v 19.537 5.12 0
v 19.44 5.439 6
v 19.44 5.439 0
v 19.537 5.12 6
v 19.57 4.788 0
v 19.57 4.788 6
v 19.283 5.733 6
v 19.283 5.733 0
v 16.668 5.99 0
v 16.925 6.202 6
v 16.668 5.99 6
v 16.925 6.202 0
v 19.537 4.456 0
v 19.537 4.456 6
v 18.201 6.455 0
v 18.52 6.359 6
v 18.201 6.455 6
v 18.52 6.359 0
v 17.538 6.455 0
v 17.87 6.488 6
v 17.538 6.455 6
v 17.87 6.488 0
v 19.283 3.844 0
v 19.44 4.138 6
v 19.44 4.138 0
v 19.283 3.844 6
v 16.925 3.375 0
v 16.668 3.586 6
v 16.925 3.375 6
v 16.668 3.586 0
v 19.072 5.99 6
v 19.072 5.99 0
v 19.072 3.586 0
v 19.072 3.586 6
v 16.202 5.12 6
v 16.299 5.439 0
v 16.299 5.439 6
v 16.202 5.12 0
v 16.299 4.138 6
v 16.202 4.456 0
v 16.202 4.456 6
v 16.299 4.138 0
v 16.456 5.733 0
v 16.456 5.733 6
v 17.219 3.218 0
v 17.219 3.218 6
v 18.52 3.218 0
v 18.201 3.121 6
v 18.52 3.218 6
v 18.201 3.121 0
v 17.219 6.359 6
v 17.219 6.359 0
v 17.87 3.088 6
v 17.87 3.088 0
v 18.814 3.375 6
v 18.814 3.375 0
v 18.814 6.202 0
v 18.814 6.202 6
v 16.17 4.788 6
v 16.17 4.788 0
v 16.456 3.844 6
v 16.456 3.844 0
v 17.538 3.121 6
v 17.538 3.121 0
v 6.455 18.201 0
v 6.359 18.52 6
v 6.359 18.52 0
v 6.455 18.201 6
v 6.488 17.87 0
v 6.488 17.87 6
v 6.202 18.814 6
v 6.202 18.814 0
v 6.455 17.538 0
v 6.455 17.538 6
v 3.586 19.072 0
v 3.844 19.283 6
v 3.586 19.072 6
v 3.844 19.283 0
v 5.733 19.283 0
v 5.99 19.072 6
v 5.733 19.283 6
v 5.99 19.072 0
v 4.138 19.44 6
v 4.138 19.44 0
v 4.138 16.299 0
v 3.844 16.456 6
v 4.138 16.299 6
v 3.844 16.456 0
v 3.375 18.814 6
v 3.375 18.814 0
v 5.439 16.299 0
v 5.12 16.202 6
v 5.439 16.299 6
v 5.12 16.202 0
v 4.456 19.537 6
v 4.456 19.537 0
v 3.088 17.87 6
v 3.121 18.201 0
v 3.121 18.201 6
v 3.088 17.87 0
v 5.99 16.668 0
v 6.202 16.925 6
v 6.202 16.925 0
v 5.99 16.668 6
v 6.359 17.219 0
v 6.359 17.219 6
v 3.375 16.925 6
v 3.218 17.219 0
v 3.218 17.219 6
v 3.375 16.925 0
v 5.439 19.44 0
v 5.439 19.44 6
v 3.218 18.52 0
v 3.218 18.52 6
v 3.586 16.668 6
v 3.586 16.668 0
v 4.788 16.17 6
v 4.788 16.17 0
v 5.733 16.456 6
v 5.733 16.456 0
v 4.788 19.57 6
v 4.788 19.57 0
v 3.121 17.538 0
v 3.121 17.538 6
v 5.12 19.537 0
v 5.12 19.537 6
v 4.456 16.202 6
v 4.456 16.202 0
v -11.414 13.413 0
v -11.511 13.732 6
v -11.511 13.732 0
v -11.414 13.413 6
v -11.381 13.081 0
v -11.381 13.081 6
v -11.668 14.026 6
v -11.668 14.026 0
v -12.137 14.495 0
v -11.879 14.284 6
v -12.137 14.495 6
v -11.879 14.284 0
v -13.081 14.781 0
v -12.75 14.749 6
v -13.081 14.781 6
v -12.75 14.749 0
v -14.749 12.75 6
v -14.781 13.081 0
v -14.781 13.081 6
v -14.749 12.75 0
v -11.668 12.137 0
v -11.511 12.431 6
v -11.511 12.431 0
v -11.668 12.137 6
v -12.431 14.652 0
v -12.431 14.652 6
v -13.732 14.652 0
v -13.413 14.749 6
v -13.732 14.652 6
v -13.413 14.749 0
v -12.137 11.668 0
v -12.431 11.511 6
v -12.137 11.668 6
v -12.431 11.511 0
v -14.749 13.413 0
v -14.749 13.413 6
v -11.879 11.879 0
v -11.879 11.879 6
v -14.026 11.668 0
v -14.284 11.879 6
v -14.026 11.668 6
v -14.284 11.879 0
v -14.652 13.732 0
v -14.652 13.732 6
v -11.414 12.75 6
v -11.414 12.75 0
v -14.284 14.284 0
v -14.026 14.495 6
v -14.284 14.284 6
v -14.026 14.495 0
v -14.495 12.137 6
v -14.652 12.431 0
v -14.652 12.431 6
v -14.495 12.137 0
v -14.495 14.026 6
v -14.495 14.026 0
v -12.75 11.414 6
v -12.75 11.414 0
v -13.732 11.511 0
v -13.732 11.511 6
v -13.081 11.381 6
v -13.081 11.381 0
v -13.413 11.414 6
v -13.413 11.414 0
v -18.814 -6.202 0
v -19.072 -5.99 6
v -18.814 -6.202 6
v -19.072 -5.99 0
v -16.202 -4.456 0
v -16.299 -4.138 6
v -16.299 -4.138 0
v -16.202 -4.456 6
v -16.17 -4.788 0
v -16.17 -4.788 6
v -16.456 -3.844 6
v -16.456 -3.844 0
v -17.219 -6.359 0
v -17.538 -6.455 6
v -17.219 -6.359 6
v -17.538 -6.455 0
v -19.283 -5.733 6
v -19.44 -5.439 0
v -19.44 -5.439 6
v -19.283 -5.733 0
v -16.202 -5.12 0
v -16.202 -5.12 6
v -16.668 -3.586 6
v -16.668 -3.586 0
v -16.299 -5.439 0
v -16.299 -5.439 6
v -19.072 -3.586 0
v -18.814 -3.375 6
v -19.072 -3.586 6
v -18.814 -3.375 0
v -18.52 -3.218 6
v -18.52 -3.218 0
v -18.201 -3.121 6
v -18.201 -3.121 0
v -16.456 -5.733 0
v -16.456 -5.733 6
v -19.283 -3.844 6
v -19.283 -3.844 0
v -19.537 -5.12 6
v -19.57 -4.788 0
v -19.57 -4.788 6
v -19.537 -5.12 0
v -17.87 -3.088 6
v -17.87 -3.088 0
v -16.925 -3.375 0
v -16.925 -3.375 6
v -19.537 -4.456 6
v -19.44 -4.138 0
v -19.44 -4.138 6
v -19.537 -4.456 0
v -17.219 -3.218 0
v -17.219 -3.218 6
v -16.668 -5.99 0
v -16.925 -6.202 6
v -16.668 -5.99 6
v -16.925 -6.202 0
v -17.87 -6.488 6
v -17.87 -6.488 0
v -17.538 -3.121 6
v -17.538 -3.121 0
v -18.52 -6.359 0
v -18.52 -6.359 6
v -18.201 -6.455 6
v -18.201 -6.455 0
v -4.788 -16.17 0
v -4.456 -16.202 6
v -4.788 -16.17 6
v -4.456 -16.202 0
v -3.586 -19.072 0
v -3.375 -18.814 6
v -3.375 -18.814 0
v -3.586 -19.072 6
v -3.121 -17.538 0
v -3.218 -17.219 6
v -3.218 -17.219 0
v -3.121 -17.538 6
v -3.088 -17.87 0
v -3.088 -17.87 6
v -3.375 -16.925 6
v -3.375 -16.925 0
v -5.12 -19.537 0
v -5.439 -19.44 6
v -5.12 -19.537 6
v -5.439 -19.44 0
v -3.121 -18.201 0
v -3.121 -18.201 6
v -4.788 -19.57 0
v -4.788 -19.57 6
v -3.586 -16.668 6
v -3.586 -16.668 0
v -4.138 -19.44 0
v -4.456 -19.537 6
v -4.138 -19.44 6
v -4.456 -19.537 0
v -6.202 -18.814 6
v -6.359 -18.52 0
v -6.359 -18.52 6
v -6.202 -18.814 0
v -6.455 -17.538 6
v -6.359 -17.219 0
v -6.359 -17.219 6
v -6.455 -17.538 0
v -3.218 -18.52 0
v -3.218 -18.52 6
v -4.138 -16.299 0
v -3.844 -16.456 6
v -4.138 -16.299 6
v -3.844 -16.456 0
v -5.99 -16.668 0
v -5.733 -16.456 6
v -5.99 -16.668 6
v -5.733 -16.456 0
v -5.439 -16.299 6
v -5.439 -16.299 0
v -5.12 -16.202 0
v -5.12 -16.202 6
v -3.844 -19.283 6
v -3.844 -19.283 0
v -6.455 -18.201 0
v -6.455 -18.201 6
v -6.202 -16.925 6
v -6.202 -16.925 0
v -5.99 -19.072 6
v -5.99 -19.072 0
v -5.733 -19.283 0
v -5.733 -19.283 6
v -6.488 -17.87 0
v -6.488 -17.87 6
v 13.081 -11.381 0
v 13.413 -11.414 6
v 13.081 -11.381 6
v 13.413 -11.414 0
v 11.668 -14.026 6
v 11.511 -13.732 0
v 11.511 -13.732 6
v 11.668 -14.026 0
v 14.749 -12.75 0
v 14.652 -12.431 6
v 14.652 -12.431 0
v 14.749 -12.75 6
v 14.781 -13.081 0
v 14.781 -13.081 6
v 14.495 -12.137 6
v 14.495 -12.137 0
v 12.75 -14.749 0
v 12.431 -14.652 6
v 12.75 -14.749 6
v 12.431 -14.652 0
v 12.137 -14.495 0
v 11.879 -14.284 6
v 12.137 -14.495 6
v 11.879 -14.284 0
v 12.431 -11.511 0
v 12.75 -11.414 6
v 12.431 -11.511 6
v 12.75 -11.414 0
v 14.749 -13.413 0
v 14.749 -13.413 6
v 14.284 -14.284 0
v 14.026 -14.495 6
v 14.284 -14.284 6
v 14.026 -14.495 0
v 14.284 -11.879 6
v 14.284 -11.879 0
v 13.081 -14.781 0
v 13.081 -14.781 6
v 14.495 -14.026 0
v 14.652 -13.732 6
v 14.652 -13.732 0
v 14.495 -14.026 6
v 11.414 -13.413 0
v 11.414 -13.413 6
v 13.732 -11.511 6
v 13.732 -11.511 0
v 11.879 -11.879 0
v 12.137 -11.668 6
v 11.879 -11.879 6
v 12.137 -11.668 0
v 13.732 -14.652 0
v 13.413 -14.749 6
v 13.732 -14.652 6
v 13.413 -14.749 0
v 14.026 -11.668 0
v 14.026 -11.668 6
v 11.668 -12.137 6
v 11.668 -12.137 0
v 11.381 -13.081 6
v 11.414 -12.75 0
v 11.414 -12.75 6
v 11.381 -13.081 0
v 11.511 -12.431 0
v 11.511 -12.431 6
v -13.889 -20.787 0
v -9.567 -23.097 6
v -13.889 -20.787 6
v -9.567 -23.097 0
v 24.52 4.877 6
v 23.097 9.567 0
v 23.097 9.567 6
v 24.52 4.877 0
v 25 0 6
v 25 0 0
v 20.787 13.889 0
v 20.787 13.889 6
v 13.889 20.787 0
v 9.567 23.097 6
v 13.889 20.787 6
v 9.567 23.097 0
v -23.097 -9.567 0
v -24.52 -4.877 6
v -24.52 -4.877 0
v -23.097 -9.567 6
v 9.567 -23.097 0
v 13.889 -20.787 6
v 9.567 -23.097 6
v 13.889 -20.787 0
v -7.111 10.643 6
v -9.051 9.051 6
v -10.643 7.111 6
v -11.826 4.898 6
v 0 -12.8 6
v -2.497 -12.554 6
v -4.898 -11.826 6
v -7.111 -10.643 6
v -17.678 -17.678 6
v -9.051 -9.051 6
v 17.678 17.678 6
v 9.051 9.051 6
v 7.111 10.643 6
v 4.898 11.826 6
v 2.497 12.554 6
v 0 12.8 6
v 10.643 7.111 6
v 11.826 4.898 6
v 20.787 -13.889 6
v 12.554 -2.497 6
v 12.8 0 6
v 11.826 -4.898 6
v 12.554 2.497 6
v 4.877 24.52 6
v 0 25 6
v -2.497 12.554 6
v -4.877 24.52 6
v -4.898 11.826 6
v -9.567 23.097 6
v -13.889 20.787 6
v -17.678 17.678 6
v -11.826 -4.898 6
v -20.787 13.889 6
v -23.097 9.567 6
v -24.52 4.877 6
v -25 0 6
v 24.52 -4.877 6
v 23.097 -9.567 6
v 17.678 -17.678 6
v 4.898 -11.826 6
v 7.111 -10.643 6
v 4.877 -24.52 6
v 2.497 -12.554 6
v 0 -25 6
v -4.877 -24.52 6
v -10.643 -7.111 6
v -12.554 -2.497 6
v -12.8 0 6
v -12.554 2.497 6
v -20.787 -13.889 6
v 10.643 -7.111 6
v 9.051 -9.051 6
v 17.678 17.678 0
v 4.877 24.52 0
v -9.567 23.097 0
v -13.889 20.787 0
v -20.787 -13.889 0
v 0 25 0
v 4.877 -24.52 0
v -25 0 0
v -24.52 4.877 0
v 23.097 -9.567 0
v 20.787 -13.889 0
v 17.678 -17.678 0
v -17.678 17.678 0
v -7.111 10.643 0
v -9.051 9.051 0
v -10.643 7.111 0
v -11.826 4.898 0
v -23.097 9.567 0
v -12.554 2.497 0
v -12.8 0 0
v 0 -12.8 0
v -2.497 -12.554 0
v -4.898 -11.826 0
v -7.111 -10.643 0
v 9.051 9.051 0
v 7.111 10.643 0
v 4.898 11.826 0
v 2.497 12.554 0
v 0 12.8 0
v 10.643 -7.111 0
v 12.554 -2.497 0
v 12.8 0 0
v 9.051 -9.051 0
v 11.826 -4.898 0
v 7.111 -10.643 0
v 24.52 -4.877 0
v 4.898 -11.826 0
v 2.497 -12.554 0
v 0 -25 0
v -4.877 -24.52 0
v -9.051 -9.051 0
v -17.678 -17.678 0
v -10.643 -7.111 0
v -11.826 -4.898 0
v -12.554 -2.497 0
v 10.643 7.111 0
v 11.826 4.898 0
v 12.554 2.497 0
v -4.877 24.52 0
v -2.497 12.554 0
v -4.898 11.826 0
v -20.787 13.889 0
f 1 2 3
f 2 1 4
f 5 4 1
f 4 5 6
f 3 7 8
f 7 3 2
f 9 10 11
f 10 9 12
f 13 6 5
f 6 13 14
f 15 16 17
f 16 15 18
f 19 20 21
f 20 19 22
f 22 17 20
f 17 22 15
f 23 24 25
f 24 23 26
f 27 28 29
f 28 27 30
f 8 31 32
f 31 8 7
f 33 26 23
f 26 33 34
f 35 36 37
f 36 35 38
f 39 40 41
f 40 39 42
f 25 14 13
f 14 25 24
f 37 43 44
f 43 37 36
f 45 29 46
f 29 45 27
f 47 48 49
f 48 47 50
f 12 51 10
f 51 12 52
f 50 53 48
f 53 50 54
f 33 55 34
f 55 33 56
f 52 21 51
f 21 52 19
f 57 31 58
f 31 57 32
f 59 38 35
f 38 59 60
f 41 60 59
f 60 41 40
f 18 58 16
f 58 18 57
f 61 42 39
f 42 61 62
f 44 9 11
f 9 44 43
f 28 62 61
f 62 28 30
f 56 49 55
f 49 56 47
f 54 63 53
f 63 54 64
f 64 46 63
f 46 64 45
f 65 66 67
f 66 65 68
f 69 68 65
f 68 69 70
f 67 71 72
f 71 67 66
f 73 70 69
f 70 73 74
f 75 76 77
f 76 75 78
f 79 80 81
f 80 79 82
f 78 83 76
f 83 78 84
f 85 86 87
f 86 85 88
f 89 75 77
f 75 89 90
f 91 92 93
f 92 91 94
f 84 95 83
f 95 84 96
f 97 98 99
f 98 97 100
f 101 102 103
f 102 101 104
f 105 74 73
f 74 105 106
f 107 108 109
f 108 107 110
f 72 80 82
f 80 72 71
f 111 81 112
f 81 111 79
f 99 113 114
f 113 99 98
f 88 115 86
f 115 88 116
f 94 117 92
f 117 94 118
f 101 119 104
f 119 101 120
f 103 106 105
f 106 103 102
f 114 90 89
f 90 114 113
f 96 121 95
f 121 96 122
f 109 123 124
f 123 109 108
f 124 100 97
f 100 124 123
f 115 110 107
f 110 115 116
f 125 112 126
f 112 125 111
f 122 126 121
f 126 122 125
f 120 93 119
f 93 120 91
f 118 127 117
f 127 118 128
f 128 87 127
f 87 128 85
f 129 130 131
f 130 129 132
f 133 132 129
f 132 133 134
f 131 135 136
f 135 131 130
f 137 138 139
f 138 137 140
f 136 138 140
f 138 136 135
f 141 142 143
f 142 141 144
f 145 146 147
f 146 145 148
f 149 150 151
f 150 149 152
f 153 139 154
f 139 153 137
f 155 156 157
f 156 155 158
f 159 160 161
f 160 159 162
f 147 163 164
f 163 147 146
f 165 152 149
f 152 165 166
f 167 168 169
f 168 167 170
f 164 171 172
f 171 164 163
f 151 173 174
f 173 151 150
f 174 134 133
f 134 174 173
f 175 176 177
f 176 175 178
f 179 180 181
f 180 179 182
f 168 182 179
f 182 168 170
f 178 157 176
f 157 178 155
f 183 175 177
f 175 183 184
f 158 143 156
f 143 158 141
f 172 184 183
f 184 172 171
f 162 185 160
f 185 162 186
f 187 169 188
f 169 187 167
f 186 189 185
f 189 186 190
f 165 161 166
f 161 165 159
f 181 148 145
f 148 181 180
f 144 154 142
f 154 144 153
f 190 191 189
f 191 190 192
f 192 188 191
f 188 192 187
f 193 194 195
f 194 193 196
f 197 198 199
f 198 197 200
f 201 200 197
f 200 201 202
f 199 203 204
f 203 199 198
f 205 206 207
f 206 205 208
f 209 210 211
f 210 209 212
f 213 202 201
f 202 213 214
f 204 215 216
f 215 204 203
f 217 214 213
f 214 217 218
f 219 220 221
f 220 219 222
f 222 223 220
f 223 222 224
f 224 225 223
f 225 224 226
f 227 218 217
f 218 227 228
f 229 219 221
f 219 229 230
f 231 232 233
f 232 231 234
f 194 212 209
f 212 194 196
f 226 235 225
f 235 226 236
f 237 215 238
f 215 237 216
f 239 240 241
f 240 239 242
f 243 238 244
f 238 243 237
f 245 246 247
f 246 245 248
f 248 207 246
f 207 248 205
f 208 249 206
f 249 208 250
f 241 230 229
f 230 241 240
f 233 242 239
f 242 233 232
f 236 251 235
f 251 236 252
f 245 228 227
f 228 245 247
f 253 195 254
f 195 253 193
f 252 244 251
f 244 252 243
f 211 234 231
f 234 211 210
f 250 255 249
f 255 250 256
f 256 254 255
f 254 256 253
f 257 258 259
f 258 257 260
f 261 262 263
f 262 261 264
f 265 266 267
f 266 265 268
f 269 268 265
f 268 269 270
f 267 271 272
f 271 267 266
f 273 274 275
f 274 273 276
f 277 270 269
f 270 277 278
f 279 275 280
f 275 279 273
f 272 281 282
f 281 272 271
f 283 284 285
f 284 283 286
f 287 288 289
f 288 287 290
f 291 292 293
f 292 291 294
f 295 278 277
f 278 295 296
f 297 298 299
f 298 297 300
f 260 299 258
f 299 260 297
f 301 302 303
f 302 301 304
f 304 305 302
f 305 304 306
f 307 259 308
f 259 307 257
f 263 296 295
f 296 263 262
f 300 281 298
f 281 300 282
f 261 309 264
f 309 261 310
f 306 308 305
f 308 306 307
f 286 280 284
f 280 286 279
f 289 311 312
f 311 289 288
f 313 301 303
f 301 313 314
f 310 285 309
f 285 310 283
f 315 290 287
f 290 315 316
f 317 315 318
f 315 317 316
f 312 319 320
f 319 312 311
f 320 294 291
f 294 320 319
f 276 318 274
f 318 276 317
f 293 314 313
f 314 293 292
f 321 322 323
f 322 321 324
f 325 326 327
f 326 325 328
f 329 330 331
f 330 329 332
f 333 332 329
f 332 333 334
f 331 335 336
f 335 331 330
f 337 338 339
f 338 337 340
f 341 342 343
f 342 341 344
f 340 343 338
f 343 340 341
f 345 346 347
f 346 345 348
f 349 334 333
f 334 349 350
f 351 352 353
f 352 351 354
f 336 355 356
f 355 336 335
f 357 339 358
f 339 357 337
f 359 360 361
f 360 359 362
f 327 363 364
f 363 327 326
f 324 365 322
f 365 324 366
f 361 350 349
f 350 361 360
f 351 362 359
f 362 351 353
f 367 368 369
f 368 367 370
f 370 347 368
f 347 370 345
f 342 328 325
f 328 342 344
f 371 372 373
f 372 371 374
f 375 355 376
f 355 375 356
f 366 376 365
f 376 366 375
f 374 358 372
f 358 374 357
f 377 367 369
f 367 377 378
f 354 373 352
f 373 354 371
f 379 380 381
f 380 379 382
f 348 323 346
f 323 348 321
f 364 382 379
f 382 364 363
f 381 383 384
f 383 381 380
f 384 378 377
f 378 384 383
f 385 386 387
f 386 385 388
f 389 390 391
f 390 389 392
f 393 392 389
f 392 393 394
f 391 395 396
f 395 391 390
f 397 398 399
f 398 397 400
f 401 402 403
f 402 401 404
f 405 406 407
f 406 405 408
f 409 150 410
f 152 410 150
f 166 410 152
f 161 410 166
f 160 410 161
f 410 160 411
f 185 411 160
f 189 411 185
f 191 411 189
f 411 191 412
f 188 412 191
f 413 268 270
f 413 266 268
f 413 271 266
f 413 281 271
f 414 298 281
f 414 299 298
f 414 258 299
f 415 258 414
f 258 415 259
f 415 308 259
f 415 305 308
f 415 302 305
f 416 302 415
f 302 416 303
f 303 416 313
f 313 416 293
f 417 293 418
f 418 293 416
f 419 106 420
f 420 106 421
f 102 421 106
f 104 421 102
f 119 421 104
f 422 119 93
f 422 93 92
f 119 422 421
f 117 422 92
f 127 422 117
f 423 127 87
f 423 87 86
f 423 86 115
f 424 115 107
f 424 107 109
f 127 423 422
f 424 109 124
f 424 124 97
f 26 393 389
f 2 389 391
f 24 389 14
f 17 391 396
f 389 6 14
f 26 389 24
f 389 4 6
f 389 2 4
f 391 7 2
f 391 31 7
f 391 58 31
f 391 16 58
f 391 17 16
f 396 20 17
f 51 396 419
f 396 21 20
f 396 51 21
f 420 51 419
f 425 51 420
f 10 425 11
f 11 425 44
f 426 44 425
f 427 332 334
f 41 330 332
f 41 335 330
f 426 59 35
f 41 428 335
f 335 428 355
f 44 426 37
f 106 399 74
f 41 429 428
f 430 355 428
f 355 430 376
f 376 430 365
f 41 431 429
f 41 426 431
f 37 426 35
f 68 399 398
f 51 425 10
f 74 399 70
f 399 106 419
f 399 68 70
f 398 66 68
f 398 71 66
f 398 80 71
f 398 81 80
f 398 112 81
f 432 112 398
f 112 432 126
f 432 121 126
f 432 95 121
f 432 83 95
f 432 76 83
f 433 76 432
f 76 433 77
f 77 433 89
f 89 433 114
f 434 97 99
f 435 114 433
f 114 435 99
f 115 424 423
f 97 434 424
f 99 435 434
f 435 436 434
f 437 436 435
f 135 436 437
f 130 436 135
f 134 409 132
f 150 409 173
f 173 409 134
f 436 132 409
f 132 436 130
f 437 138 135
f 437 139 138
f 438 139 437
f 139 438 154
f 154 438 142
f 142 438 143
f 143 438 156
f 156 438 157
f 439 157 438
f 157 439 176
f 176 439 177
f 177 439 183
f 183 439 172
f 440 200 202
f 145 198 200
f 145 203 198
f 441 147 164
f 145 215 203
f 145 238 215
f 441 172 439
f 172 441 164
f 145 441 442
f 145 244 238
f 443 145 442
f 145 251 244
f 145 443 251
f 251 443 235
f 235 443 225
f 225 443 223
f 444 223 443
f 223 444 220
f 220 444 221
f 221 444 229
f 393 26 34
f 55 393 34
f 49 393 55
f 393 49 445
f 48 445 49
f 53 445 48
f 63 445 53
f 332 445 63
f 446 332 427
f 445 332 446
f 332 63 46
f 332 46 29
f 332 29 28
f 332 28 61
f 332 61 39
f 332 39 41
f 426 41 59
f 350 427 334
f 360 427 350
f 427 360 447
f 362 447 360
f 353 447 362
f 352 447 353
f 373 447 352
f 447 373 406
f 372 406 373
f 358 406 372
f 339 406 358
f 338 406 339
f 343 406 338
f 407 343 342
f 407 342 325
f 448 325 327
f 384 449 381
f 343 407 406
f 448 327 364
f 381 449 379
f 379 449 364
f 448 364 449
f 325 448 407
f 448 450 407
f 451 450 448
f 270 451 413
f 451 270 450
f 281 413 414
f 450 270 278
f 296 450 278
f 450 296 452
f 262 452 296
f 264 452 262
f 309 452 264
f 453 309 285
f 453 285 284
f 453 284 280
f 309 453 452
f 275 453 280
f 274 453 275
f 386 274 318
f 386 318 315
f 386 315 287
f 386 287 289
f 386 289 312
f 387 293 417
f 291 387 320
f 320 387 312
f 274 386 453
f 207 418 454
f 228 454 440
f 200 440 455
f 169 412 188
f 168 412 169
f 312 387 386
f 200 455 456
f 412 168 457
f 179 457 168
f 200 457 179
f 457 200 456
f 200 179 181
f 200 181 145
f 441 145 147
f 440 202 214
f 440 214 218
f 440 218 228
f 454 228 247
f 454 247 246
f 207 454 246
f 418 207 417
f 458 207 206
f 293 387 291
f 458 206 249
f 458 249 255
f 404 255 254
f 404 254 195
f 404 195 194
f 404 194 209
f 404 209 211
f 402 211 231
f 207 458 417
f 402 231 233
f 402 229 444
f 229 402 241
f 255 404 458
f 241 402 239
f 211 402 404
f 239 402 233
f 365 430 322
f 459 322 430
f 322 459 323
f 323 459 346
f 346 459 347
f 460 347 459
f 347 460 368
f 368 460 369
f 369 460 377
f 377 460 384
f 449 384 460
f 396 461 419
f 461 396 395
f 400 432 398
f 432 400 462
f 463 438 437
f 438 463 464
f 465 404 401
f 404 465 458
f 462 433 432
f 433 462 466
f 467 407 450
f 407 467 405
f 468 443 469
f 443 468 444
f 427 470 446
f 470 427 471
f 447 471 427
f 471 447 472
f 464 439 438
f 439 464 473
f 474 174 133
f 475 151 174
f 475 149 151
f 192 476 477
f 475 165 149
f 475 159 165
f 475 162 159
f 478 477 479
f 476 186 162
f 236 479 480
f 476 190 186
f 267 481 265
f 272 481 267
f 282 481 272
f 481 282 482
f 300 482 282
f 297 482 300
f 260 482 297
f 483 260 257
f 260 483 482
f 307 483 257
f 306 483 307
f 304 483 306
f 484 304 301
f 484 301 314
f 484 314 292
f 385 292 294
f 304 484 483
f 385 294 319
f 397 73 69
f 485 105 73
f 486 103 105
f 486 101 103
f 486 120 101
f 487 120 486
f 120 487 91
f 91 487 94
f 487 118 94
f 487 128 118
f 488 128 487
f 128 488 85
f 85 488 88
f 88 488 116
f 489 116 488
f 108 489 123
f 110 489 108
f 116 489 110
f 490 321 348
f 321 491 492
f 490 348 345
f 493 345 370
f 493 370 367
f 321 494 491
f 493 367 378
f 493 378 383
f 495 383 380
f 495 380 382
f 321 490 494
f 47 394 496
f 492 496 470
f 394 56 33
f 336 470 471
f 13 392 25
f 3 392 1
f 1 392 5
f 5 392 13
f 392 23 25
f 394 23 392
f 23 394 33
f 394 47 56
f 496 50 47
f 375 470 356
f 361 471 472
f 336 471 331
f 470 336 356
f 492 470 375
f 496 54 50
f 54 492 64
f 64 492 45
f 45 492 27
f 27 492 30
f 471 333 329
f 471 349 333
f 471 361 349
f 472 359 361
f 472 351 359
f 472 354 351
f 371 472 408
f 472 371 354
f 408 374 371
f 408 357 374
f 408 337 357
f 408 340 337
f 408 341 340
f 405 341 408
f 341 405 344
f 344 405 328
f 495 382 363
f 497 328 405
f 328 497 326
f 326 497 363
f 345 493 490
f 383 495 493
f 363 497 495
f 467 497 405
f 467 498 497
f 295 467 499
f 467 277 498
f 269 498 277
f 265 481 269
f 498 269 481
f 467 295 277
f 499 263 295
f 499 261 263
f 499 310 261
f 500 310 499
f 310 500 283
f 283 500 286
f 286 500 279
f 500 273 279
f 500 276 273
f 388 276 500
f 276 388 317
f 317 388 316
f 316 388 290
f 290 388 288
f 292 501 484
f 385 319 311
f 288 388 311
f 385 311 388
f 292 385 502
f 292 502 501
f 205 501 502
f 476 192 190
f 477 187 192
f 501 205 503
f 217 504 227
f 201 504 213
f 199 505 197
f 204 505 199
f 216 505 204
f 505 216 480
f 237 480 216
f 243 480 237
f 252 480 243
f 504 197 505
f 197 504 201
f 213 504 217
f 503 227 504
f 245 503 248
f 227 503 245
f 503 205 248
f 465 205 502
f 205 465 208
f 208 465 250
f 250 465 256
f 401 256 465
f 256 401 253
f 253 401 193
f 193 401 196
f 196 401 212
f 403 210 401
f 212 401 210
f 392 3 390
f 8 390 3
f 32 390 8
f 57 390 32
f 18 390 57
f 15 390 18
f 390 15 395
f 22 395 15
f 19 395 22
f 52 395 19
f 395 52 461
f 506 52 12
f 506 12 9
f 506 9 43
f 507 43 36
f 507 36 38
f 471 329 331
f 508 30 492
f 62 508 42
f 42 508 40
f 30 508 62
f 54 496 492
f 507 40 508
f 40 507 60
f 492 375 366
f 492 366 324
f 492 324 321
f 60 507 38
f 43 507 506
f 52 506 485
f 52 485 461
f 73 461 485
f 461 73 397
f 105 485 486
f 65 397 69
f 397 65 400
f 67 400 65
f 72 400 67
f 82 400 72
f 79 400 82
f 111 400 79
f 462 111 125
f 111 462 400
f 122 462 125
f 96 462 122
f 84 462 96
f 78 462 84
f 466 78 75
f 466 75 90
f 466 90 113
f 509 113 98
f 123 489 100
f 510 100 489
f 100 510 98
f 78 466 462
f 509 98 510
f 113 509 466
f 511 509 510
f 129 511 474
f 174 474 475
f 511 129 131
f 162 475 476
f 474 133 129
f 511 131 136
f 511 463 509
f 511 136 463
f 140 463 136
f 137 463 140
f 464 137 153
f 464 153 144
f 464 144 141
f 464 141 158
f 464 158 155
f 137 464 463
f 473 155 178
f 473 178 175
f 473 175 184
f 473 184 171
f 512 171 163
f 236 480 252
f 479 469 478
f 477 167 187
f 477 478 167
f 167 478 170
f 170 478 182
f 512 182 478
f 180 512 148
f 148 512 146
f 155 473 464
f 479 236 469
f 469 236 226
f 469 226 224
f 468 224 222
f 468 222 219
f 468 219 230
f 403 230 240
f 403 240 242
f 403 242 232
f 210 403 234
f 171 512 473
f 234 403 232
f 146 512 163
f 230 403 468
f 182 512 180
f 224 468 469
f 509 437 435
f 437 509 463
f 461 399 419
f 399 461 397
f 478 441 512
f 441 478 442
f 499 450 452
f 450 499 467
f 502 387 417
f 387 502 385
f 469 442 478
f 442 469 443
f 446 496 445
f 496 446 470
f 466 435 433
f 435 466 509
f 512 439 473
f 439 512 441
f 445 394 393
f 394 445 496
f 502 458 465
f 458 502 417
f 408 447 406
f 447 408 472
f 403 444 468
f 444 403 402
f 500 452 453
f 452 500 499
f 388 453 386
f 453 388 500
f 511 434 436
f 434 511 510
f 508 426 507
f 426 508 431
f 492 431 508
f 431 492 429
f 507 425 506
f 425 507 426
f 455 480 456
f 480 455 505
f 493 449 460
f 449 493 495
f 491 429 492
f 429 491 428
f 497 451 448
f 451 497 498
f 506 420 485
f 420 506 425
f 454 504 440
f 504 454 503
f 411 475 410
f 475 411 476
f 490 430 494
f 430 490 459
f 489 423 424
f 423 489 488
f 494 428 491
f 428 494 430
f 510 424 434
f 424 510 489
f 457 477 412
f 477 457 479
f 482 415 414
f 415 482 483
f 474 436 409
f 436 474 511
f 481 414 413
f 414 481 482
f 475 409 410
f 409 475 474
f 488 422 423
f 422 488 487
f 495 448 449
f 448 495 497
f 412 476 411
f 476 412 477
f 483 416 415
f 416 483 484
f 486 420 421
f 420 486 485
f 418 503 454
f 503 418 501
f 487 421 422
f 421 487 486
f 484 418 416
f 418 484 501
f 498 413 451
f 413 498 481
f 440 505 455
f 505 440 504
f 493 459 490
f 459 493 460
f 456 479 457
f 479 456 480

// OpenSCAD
$fn = 32;

// ----------------------------------------------------------------------
// Flange Ø50 x 6
// 6 holes on a Ø37 bolt circle, bolted joints
// ----------------------------------------------------------------------

// --- parameters (mm) ---
flange_d = 50;   // outside diameter of the flange
thickness = 6;   // flange thickness
holes = 6;       // number of bolt holes
pcd = 37;        // bolt circle diameter
start_deg = 15;  // angle of the first hole, from +X
hole_d = 3.4;    // bolt hole diameter
bore_d = 25.6;   // central through bore
hub_d = 37.6;    // hub outside diameter
hub_h = 0;       // hub height above the flange face (0 = no hub)

// --- derived feature positions (mm) ---
height = thickness + hub_h;  // = 6   overall height of the part
pcd_r = pcd / 2;             // = 18.5   bolt circle radius
hole_step = 360 / holes;     // = 60   angular pitch
feature_centers = [
  [pcd_r * cos(start_deg + 0 * hole_step), pcd_r * sin(start_deg + 0 * hole_step)],
  [pcd_r * cos(start_deg + 1 * hole_step), pcd_r * sin(start_deg + 1 * hole_step)],
  [pcd_r * cos(start_deg + 2 * hole_step), pcd_r * sin(start_deg + 2 * hole_step)],
  [pcd_r * cos(start_deg + 3 * hole_step), pcd_r * sin(start_deg + 3 * hole_step)],
  [pcd_r * cos(start_deg + 4 * hole_step), pcd_r * sin(start_deg + 4 * hole_step)],
  [pcd_r * cos(start_deg + 5 * hole_step), pcd_r * sin(start_deg + 5 * hole_step)]
];   // bolt hole centres on the pitch circle

// flange disc, every hole and the bore cut straight through
difference() {
  union() {
    cylinder(d = flange_d, h = thickness);
  }
  translate([0, 0, -1]) cylinder(d = bore_d, h = height + 2);  // bore, through
  for (centre = feature_centers)
    translate([centre[0], centre[1], -1]) cylinder(d = hole_d, h = thickness + 2);
}
